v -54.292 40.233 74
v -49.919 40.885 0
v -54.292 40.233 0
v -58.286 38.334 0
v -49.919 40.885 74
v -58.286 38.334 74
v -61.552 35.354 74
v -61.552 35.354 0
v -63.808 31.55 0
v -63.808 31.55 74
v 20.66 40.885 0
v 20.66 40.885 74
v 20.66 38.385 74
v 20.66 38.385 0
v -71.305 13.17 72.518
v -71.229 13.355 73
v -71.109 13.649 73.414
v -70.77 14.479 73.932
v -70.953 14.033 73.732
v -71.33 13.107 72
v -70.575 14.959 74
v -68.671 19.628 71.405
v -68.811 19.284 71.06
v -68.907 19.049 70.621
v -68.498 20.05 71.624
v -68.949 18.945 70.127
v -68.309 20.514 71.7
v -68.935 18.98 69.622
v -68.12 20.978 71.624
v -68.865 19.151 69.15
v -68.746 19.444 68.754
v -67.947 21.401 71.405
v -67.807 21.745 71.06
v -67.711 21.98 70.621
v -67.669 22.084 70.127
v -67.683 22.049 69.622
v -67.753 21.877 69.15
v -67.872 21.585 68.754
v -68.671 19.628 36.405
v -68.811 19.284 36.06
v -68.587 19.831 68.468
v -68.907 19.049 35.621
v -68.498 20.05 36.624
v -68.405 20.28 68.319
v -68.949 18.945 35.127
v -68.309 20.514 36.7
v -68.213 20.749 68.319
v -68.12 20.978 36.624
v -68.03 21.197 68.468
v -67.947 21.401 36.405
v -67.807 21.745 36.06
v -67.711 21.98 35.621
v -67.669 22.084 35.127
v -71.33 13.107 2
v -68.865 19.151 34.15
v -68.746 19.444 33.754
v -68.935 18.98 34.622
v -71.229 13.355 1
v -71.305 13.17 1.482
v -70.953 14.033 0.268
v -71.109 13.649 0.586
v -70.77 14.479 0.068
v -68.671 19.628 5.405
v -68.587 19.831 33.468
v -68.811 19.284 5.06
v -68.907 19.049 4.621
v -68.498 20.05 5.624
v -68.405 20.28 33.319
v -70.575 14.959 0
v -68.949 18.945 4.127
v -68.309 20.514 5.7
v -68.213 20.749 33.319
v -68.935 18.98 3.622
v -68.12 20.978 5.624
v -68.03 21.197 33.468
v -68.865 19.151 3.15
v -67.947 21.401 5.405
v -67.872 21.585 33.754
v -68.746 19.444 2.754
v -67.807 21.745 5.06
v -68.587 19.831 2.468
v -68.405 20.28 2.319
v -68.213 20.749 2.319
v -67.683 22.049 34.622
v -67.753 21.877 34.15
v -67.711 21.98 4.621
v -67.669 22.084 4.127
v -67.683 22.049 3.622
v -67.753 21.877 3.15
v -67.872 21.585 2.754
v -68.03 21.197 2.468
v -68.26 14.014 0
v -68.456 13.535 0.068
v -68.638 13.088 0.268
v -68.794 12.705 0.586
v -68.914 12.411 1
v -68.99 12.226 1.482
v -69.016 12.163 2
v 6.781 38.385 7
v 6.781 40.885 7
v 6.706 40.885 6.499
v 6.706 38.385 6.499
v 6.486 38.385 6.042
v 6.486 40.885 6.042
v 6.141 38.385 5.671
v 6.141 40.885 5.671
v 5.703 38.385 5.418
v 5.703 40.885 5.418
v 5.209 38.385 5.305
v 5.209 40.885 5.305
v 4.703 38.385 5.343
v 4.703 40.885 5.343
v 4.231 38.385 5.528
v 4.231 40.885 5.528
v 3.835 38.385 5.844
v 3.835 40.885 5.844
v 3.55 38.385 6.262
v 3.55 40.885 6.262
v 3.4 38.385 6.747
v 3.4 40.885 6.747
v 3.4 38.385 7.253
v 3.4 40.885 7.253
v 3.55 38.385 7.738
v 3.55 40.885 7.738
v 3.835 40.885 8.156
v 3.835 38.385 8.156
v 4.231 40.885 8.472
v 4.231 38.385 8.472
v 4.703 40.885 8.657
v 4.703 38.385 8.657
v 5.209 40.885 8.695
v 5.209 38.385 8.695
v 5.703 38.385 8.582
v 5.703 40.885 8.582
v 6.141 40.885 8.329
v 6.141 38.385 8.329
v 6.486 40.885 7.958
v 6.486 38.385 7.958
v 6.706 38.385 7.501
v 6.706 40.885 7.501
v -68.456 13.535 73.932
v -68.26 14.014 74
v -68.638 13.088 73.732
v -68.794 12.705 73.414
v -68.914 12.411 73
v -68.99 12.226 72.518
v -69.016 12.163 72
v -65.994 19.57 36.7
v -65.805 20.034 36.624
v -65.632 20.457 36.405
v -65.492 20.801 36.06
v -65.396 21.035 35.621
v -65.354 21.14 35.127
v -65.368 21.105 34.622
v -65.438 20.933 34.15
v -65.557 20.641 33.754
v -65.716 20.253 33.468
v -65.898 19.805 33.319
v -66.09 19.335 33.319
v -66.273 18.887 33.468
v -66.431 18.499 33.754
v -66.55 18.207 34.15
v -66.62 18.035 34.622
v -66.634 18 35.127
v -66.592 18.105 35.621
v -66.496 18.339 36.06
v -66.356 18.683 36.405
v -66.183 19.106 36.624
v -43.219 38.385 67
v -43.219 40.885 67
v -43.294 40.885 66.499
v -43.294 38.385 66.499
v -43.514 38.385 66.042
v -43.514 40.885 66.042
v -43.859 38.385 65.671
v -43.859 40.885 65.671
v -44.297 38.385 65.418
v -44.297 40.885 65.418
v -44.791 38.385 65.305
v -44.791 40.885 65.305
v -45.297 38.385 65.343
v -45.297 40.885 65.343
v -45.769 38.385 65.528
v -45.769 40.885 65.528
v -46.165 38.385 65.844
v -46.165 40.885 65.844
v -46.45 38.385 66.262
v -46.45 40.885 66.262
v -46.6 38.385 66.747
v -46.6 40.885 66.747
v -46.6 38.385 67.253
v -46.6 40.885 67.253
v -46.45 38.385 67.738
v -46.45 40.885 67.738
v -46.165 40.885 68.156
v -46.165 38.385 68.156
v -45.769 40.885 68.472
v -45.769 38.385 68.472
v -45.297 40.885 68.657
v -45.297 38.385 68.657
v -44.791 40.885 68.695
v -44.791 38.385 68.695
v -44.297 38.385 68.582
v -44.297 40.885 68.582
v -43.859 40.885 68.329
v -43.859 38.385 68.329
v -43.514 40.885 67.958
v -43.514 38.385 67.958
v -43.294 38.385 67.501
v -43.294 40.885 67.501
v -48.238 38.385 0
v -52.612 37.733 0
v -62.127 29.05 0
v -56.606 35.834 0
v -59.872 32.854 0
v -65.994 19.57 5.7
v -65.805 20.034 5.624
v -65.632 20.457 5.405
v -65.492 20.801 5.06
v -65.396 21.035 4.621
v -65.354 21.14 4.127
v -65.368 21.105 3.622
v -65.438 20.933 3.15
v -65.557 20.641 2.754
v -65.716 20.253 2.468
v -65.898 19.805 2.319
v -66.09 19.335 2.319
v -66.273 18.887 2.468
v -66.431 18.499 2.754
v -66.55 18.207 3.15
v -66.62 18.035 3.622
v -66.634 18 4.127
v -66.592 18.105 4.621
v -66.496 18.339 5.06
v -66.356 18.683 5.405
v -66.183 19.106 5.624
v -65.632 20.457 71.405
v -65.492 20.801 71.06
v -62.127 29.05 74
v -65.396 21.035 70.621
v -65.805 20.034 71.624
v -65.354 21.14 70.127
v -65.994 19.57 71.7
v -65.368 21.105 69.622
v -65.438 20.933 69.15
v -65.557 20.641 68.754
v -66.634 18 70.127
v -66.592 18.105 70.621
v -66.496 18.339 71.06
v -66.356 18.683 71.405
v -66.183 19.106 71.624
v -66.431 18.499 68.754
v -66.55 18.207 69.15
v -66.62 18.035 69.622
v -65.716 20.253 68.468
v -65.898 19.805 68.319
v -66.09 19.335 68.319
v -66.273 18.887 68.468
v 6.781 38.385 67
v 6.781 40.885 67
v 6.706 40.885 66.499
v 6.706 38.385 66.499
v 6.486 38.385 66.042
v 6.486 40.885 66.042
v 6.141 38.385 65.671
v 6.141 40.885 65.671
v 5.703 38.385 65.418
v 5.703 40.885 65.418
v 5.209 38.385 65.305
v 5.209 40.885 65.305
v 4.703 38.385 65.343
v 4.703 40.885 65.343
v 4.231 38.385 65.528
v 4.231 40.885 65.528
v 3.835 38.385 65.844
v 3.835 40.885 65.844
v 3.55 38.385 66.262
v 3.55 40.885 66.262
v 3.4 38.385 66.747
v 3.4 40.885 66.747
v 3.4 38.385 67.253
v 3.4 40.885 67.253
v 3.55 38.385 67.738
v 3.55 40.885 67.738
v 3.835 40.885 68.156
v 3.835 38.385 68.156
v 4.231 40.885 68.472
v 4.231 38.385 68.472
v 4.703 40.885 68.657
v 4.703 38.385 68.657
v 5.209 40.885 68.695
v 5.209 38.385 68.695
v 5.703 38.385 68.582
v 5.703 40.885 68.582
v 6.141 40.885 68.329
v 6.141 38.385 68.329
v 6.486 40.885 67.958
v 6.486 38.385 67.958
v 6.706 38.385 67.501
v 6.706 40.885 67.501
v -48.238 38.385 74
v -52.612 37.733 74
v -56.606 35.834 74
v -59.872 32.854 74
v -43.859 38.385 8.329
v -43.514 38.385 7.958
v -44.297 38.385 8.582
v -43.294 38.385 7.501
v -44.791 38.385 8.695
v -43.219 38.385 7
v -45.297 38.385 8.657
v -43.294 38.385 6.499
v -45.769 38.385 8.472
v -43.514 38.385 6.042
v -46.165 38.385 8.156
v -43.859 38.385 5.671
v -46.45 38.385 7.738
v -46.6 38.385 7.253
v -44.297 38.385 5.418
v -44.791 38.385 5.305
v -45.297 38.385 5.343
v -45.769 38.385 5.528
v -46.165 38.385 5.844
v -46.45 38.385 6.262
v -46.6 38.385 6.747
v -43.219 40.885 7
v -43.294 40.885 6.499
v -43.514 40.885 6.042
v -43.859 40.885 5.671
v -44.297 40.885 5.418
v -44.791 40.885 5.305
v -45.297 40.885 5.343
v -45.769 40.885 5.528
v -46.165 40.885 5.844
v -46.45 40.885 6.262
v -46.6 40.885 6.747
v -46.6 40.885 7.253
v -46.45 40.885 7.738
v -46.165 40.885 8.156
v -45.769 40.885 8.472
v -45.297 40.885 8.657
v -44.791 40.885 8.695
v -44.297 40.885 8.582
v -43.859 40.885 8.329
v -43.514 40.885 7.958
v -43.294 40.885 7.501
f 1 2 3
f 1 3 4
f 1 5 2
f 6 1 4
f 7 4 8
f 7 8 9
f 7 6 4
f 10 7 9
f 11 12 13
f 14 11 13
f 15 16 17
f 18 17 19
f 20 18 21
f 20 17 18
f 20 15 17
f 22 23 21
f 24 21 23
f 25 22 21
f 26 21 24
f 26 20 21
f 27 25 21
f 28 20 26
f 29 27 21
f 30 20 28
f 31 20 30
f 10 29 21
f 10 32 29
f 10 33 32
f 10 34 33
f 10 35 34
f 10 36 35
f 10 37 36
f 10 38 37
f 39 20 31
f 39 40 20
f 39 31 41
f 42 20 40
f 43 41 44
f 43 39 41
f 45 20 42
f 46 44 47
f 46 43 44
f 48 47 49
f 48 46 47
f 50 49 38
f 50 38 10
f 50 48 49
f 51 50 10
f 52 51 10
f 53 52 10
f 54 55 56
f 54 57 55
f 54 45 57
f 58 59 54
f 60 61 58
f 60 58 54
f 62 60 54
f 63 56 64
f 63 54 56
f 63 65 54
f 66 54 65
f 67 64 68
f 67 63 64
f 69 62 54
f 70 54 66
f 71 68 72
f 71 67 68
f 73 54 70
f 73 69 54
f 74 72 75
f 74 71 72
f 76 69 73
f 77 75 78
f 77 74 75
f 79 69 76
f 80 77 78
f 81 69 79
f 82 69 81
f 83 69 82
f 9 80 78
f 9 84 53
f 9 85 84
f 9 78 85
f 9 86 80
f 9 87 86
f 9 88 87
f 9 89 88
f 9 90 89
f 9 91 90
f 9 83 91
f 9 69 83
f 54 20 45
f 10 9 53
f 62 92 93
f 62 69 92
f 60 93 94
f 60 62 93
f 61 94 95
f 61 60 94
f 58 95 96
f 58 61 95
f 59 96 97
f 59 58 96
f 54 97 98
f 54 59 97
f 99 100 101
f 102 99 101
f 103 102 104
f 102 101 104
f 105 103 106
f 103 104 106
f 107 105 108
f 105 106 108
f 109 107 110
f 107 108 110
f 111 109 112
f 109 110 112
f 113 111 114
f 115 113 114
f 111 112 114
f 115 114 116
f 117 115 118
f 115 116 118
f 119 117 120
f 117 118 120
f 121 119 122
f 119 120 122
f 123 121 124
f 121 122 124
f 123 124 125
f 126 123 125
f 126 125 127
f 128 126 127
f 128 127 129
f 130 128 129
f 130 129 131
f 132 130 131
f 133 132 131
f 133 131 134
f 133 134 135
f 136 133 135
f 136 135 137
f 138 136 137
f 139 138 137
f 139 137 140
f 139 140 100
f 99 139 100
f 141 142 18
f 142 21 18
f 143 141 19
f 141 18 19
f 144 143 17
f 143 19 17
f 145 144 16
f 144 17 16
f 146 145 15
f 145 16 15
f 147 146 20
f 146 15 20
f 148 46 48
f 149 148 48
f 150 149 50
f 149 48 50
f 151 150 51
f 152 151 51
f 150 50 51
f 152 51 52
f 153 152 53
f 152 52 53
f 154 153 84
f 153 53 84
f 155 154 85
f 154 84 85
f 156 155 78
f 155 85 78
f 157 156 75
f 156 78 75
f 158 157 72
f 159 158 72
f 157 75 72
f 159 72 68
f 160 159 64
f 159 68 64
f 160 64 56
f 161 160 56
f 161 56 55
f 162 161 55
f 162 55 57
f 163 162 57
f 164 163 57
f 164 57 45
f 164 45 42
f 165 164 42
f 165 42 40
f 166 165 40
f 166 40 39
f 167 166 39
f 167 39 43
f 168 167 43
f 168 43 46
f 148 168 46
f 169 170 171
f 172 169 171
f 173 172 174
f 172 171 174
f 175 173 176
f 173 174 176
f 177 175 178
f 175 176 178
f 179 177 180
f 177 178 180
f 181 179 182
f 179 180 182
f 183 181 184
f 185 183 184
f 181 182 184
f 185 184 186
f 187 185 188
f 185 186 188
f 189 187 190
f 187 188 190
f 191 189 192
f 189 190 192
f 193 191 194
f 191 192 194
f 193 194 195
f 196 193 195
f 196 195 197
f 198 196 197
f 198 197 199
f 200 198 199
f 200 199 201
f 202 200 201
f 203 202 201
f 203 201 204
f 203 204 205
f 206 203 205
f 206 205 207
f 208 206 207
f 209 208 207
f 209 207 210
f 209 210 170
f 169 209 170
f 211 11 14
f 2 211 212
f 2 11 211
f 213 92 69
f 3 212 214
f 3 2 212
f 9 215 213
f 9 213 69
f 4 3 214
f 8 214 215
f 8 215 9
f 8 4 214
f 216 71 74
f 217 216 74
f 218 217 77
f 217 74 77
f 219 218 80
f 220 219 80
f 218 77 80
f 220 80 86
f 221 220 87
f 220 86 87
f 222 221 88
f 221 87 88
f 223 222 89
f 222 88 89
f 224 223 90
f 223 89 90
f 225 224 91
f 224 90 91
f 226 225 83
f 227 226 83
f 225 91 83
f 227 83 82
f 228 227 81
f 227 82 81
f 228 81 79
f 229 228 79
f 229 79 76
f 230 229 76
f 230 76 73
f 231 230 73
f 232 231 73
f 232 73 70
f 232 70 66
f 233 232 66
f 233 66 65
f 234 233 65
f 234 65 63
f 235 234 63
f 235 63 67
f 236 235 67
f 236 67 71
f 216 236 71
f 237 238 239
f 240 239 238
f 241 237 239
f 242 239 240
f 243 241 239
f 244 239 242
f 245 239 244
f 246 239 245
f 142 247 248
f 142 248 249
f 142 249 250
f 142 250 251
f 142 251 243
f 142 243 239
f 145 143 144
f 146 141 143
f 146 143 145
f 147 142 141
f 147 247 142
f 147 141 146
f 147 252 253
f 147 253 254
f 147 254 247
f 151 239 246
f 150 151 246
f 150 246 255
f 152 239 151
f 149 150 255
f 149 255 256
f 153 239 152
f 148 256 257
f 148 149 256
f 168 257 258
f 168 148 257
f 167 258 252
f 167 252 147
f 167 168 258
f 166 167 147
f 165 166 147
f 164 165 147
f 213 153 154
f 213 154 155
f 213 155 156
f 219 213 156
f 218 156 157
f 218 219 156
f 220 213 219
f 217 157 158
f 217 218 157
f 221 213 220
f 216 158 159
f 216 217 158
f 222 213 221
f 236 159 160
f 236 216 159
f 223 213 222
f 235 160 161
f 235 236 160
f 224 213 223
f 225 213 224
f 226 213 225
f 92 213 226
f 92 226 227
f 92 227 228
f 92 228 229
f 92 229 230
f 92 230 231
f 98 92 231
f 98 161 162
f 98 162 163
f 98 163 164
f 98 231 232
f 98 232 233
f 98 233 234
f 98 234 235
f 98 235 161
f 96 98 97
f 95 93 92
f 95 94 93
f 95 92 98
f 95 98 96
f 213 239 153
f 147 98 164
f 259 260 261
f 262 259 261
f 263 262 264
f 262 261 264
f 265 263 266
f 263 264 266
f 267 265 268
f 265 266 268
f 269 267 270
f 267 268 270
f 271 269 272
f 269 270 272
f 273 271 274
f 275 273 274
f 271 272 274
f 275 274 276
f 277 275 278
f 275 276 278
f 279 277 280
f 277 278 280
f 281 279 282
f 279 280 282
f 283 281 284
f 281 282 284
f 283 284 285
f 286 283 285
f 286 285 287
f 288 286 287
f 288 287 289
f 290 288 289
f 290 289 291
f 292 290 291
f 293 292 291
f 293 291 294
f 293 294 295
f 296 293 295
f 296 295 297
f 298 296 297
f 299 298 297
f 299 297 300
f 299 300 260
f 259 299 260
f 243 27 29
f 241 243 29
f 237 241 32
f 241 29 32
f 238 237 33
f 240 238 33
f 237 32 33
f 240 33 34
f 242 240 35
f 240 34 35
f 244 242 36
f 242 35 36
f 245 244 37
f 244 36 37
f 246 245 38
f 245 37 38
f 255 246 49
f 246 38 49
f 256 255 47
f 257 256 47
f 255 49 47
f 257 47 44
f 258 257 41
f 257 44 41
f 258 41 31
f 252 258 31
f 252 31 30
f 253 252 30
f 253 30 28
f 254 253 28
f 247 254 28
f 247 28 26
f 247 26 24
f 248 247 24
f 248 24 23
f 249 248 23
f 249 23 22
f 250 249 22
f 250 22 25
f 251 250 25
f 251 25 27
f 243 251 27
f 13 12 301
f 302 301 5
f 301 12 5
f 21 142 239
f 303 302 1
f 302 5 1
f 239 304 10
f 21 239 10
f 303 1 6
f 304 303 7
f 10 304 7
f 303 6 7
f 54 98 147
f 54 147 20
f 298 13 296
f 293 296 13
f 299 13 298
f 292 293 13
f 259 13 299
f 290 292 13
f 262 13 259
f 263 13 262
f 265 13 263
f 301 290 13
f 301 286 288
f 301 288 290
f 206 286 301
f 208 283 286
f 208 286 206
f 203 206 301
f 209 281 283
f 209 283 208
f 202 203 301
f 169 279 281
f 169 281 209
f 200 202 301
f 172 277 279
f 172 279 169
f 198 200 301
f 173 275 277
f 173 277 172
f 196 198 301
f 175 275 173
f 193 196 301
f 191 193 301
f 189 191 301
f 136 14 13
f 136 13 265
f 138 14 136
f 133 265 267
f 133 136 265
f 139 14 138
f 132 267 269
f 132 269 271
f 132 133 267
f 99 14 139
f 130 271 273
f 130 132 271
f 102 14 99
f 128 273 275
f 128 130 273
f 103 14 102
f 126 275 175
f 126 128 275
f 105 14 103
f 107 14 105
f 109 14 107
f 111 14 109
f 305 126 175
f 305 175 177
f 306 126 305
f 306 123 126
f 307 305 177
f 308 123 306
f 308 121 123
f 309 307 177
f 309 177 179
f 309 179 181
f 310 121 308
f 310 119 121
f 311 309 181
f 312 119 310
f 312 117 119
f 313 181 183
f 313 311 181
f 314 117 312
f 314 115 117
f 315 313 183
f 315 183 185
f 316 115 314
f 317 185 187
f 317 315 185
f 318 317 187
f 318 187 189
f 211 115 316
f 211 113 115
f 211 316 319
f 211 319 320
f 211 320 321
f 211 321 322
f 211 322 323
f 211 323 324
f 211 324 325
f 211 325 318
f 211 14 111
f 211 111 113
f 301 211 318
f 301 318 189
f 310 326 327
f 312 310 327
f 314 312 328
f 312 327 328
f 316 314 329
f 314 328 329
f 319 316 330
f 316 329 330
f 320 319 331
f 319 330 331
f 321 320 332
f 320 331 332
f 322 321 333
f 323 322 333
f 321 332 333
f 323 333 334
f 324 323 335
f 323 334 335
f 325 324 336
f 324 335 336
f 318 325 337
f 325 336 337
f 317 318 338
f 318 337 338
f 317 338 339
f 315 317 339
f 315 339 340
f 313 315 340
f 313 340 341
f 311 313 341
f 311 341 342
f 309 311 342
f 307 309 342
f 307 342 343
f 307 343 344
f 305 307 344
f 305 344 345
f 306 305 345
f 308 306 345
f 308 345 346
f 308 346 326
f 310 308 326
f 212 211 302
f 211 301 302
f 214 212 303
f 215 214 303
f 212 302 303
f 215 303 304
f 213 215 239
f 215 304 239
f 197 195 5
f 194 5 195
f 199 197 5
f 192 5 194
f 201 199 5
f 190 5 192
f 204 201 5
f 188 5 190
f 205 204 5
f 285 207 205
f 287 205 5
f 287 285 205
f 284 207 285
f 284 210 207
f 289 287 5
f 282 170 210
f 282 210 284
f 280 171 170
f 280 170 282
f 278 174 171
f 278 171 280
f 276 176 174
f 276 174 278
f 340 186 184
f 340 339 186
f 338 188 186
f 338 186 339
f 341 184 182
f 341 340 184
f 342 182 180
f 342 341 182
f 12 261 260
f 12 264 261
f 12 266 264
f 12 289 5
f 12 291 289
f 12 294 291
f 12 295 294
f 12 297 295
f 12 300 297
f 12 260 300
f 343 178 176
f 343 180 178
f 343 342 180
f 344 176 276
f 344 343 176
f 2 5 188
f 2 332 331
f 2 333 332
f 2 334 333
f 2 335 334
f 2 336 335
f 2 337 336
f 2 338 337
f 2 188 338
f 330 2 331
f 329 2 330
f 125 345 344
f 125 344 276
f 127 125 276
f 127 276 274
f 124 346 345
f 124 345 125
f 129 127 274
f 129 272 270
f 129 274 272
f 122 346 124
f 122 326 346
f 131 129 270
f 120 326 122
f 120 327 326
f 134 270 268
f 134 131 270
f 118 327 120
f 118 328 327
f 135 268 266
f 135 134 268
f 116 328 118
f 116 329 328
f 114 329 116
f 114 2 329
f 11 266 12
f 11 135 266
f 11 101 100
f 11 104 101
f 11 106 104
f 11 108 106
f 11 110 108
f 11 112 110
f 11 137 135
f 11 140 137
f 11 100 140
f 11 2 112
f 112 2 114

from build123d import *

# Parameters (mm, degrees)
ESTRUSIONE_ESTRUSIONE2_DEPTH  = 74
RACCORDO3_R                   = 15
RACCORDO4_R                   = 2
SCHIZZO10_R                   = 1.7
TAGLIO_ESTRUSIONE1_DEPTH      = 10
SCHIZZO13_R                   = 1.7
TAGLIO_ESTRUSIONE3_DEPTH      = 11.491186204
TAGLIO_ESTRUSIONE3_DEPTH_BACK = 86.53385939


with BuildPart() as part:
    # Schizzo2 → Estrusione-Estrusione2 (new body)
    with BuildSketch(Plane.XY):
        Polygon((-60, 40.884860172), (20.66, 40.884860172), (20.66, 38.384860172), (-58.319751134, 38.384860172), (-69.015504429, 12.162557341), (-71.330346702, 13.1067529), align=None)
    extrude(amount=ESTRUSIONE_ESTRUSIONE2_DEPTH)

    # Raccordo3
    raccordo3_edges = [part.edges().sort_by_distance(p)[0] for p in [
        (-60, 40.884860172, 37),
        (-58.319751134, 38.384860172, 37),
    ]]
    fillet(raccordo3_edges, radius=RACCORDO3_R)

    # Raccordo4
    raccordo4_edges = [part.edges().sort_by_distance(p)[0] for p in [
        (-70.172925565, 12.63465512, 74),
        (-70.172925565, 12.63465512, 0),
    ]]
    fillet(raccordo4_edges, radius=RACCORDO4_R)

    # Schizzo10 → Taglio-Estrusione1 (cut)
    with BuildSketch(Plane(origin=(0, 40.884860172, 0), x_dir=(1, 0, 0), z_dir=(0, 1, 0))):
        with Locations((5.081493197, -67)):
            Circle(SCHIZZO10_R)
        with Locations((5.081493197, -7)):
            Circle(SCHIZZO10_R)
        with Locations((-44.918506803, -67)):
            Circle(SCHIZZO10_R)
        with Locations((-44.918506803, -7)):
            Circle(SCHIZZO10_R)
    extrude(amount=-TAGLIO_ESTRUSIONE1_DEPTH, mode=Mode.SUBTRACT)

    # Schizzo13 → Taglio-Estrusione3 (cut, two sides)
    with BuildSketch(Plane(origin=(-65.73923894, 26.814223222, 0), x_dir=(0, 0, 1), z_dir=(-0.925936909, 0.377678223, 0))) as taglio_estrusione3_sk:
        with Locations((4, -6.803892348)):
            Circle(SCHIZZO13_R)
        with Locations((70, -6.803892348)):
            Circle(SCHIZZO13_R)
        with Locations((35, -6.803892348)):
            Circle(SCHIZZO13_R)
    extrude(amount=TAGLIO_ESTRUSIONE3_DEPTH, mode=Mode.SUBTRACT)
    extrude(taglio_estrusione3_sk.sketch, amount=-TAGLIO_ESTRUSIONE3_DEPTH_BACK, mode=Mode.SUBTRACT)


solid = part.part
